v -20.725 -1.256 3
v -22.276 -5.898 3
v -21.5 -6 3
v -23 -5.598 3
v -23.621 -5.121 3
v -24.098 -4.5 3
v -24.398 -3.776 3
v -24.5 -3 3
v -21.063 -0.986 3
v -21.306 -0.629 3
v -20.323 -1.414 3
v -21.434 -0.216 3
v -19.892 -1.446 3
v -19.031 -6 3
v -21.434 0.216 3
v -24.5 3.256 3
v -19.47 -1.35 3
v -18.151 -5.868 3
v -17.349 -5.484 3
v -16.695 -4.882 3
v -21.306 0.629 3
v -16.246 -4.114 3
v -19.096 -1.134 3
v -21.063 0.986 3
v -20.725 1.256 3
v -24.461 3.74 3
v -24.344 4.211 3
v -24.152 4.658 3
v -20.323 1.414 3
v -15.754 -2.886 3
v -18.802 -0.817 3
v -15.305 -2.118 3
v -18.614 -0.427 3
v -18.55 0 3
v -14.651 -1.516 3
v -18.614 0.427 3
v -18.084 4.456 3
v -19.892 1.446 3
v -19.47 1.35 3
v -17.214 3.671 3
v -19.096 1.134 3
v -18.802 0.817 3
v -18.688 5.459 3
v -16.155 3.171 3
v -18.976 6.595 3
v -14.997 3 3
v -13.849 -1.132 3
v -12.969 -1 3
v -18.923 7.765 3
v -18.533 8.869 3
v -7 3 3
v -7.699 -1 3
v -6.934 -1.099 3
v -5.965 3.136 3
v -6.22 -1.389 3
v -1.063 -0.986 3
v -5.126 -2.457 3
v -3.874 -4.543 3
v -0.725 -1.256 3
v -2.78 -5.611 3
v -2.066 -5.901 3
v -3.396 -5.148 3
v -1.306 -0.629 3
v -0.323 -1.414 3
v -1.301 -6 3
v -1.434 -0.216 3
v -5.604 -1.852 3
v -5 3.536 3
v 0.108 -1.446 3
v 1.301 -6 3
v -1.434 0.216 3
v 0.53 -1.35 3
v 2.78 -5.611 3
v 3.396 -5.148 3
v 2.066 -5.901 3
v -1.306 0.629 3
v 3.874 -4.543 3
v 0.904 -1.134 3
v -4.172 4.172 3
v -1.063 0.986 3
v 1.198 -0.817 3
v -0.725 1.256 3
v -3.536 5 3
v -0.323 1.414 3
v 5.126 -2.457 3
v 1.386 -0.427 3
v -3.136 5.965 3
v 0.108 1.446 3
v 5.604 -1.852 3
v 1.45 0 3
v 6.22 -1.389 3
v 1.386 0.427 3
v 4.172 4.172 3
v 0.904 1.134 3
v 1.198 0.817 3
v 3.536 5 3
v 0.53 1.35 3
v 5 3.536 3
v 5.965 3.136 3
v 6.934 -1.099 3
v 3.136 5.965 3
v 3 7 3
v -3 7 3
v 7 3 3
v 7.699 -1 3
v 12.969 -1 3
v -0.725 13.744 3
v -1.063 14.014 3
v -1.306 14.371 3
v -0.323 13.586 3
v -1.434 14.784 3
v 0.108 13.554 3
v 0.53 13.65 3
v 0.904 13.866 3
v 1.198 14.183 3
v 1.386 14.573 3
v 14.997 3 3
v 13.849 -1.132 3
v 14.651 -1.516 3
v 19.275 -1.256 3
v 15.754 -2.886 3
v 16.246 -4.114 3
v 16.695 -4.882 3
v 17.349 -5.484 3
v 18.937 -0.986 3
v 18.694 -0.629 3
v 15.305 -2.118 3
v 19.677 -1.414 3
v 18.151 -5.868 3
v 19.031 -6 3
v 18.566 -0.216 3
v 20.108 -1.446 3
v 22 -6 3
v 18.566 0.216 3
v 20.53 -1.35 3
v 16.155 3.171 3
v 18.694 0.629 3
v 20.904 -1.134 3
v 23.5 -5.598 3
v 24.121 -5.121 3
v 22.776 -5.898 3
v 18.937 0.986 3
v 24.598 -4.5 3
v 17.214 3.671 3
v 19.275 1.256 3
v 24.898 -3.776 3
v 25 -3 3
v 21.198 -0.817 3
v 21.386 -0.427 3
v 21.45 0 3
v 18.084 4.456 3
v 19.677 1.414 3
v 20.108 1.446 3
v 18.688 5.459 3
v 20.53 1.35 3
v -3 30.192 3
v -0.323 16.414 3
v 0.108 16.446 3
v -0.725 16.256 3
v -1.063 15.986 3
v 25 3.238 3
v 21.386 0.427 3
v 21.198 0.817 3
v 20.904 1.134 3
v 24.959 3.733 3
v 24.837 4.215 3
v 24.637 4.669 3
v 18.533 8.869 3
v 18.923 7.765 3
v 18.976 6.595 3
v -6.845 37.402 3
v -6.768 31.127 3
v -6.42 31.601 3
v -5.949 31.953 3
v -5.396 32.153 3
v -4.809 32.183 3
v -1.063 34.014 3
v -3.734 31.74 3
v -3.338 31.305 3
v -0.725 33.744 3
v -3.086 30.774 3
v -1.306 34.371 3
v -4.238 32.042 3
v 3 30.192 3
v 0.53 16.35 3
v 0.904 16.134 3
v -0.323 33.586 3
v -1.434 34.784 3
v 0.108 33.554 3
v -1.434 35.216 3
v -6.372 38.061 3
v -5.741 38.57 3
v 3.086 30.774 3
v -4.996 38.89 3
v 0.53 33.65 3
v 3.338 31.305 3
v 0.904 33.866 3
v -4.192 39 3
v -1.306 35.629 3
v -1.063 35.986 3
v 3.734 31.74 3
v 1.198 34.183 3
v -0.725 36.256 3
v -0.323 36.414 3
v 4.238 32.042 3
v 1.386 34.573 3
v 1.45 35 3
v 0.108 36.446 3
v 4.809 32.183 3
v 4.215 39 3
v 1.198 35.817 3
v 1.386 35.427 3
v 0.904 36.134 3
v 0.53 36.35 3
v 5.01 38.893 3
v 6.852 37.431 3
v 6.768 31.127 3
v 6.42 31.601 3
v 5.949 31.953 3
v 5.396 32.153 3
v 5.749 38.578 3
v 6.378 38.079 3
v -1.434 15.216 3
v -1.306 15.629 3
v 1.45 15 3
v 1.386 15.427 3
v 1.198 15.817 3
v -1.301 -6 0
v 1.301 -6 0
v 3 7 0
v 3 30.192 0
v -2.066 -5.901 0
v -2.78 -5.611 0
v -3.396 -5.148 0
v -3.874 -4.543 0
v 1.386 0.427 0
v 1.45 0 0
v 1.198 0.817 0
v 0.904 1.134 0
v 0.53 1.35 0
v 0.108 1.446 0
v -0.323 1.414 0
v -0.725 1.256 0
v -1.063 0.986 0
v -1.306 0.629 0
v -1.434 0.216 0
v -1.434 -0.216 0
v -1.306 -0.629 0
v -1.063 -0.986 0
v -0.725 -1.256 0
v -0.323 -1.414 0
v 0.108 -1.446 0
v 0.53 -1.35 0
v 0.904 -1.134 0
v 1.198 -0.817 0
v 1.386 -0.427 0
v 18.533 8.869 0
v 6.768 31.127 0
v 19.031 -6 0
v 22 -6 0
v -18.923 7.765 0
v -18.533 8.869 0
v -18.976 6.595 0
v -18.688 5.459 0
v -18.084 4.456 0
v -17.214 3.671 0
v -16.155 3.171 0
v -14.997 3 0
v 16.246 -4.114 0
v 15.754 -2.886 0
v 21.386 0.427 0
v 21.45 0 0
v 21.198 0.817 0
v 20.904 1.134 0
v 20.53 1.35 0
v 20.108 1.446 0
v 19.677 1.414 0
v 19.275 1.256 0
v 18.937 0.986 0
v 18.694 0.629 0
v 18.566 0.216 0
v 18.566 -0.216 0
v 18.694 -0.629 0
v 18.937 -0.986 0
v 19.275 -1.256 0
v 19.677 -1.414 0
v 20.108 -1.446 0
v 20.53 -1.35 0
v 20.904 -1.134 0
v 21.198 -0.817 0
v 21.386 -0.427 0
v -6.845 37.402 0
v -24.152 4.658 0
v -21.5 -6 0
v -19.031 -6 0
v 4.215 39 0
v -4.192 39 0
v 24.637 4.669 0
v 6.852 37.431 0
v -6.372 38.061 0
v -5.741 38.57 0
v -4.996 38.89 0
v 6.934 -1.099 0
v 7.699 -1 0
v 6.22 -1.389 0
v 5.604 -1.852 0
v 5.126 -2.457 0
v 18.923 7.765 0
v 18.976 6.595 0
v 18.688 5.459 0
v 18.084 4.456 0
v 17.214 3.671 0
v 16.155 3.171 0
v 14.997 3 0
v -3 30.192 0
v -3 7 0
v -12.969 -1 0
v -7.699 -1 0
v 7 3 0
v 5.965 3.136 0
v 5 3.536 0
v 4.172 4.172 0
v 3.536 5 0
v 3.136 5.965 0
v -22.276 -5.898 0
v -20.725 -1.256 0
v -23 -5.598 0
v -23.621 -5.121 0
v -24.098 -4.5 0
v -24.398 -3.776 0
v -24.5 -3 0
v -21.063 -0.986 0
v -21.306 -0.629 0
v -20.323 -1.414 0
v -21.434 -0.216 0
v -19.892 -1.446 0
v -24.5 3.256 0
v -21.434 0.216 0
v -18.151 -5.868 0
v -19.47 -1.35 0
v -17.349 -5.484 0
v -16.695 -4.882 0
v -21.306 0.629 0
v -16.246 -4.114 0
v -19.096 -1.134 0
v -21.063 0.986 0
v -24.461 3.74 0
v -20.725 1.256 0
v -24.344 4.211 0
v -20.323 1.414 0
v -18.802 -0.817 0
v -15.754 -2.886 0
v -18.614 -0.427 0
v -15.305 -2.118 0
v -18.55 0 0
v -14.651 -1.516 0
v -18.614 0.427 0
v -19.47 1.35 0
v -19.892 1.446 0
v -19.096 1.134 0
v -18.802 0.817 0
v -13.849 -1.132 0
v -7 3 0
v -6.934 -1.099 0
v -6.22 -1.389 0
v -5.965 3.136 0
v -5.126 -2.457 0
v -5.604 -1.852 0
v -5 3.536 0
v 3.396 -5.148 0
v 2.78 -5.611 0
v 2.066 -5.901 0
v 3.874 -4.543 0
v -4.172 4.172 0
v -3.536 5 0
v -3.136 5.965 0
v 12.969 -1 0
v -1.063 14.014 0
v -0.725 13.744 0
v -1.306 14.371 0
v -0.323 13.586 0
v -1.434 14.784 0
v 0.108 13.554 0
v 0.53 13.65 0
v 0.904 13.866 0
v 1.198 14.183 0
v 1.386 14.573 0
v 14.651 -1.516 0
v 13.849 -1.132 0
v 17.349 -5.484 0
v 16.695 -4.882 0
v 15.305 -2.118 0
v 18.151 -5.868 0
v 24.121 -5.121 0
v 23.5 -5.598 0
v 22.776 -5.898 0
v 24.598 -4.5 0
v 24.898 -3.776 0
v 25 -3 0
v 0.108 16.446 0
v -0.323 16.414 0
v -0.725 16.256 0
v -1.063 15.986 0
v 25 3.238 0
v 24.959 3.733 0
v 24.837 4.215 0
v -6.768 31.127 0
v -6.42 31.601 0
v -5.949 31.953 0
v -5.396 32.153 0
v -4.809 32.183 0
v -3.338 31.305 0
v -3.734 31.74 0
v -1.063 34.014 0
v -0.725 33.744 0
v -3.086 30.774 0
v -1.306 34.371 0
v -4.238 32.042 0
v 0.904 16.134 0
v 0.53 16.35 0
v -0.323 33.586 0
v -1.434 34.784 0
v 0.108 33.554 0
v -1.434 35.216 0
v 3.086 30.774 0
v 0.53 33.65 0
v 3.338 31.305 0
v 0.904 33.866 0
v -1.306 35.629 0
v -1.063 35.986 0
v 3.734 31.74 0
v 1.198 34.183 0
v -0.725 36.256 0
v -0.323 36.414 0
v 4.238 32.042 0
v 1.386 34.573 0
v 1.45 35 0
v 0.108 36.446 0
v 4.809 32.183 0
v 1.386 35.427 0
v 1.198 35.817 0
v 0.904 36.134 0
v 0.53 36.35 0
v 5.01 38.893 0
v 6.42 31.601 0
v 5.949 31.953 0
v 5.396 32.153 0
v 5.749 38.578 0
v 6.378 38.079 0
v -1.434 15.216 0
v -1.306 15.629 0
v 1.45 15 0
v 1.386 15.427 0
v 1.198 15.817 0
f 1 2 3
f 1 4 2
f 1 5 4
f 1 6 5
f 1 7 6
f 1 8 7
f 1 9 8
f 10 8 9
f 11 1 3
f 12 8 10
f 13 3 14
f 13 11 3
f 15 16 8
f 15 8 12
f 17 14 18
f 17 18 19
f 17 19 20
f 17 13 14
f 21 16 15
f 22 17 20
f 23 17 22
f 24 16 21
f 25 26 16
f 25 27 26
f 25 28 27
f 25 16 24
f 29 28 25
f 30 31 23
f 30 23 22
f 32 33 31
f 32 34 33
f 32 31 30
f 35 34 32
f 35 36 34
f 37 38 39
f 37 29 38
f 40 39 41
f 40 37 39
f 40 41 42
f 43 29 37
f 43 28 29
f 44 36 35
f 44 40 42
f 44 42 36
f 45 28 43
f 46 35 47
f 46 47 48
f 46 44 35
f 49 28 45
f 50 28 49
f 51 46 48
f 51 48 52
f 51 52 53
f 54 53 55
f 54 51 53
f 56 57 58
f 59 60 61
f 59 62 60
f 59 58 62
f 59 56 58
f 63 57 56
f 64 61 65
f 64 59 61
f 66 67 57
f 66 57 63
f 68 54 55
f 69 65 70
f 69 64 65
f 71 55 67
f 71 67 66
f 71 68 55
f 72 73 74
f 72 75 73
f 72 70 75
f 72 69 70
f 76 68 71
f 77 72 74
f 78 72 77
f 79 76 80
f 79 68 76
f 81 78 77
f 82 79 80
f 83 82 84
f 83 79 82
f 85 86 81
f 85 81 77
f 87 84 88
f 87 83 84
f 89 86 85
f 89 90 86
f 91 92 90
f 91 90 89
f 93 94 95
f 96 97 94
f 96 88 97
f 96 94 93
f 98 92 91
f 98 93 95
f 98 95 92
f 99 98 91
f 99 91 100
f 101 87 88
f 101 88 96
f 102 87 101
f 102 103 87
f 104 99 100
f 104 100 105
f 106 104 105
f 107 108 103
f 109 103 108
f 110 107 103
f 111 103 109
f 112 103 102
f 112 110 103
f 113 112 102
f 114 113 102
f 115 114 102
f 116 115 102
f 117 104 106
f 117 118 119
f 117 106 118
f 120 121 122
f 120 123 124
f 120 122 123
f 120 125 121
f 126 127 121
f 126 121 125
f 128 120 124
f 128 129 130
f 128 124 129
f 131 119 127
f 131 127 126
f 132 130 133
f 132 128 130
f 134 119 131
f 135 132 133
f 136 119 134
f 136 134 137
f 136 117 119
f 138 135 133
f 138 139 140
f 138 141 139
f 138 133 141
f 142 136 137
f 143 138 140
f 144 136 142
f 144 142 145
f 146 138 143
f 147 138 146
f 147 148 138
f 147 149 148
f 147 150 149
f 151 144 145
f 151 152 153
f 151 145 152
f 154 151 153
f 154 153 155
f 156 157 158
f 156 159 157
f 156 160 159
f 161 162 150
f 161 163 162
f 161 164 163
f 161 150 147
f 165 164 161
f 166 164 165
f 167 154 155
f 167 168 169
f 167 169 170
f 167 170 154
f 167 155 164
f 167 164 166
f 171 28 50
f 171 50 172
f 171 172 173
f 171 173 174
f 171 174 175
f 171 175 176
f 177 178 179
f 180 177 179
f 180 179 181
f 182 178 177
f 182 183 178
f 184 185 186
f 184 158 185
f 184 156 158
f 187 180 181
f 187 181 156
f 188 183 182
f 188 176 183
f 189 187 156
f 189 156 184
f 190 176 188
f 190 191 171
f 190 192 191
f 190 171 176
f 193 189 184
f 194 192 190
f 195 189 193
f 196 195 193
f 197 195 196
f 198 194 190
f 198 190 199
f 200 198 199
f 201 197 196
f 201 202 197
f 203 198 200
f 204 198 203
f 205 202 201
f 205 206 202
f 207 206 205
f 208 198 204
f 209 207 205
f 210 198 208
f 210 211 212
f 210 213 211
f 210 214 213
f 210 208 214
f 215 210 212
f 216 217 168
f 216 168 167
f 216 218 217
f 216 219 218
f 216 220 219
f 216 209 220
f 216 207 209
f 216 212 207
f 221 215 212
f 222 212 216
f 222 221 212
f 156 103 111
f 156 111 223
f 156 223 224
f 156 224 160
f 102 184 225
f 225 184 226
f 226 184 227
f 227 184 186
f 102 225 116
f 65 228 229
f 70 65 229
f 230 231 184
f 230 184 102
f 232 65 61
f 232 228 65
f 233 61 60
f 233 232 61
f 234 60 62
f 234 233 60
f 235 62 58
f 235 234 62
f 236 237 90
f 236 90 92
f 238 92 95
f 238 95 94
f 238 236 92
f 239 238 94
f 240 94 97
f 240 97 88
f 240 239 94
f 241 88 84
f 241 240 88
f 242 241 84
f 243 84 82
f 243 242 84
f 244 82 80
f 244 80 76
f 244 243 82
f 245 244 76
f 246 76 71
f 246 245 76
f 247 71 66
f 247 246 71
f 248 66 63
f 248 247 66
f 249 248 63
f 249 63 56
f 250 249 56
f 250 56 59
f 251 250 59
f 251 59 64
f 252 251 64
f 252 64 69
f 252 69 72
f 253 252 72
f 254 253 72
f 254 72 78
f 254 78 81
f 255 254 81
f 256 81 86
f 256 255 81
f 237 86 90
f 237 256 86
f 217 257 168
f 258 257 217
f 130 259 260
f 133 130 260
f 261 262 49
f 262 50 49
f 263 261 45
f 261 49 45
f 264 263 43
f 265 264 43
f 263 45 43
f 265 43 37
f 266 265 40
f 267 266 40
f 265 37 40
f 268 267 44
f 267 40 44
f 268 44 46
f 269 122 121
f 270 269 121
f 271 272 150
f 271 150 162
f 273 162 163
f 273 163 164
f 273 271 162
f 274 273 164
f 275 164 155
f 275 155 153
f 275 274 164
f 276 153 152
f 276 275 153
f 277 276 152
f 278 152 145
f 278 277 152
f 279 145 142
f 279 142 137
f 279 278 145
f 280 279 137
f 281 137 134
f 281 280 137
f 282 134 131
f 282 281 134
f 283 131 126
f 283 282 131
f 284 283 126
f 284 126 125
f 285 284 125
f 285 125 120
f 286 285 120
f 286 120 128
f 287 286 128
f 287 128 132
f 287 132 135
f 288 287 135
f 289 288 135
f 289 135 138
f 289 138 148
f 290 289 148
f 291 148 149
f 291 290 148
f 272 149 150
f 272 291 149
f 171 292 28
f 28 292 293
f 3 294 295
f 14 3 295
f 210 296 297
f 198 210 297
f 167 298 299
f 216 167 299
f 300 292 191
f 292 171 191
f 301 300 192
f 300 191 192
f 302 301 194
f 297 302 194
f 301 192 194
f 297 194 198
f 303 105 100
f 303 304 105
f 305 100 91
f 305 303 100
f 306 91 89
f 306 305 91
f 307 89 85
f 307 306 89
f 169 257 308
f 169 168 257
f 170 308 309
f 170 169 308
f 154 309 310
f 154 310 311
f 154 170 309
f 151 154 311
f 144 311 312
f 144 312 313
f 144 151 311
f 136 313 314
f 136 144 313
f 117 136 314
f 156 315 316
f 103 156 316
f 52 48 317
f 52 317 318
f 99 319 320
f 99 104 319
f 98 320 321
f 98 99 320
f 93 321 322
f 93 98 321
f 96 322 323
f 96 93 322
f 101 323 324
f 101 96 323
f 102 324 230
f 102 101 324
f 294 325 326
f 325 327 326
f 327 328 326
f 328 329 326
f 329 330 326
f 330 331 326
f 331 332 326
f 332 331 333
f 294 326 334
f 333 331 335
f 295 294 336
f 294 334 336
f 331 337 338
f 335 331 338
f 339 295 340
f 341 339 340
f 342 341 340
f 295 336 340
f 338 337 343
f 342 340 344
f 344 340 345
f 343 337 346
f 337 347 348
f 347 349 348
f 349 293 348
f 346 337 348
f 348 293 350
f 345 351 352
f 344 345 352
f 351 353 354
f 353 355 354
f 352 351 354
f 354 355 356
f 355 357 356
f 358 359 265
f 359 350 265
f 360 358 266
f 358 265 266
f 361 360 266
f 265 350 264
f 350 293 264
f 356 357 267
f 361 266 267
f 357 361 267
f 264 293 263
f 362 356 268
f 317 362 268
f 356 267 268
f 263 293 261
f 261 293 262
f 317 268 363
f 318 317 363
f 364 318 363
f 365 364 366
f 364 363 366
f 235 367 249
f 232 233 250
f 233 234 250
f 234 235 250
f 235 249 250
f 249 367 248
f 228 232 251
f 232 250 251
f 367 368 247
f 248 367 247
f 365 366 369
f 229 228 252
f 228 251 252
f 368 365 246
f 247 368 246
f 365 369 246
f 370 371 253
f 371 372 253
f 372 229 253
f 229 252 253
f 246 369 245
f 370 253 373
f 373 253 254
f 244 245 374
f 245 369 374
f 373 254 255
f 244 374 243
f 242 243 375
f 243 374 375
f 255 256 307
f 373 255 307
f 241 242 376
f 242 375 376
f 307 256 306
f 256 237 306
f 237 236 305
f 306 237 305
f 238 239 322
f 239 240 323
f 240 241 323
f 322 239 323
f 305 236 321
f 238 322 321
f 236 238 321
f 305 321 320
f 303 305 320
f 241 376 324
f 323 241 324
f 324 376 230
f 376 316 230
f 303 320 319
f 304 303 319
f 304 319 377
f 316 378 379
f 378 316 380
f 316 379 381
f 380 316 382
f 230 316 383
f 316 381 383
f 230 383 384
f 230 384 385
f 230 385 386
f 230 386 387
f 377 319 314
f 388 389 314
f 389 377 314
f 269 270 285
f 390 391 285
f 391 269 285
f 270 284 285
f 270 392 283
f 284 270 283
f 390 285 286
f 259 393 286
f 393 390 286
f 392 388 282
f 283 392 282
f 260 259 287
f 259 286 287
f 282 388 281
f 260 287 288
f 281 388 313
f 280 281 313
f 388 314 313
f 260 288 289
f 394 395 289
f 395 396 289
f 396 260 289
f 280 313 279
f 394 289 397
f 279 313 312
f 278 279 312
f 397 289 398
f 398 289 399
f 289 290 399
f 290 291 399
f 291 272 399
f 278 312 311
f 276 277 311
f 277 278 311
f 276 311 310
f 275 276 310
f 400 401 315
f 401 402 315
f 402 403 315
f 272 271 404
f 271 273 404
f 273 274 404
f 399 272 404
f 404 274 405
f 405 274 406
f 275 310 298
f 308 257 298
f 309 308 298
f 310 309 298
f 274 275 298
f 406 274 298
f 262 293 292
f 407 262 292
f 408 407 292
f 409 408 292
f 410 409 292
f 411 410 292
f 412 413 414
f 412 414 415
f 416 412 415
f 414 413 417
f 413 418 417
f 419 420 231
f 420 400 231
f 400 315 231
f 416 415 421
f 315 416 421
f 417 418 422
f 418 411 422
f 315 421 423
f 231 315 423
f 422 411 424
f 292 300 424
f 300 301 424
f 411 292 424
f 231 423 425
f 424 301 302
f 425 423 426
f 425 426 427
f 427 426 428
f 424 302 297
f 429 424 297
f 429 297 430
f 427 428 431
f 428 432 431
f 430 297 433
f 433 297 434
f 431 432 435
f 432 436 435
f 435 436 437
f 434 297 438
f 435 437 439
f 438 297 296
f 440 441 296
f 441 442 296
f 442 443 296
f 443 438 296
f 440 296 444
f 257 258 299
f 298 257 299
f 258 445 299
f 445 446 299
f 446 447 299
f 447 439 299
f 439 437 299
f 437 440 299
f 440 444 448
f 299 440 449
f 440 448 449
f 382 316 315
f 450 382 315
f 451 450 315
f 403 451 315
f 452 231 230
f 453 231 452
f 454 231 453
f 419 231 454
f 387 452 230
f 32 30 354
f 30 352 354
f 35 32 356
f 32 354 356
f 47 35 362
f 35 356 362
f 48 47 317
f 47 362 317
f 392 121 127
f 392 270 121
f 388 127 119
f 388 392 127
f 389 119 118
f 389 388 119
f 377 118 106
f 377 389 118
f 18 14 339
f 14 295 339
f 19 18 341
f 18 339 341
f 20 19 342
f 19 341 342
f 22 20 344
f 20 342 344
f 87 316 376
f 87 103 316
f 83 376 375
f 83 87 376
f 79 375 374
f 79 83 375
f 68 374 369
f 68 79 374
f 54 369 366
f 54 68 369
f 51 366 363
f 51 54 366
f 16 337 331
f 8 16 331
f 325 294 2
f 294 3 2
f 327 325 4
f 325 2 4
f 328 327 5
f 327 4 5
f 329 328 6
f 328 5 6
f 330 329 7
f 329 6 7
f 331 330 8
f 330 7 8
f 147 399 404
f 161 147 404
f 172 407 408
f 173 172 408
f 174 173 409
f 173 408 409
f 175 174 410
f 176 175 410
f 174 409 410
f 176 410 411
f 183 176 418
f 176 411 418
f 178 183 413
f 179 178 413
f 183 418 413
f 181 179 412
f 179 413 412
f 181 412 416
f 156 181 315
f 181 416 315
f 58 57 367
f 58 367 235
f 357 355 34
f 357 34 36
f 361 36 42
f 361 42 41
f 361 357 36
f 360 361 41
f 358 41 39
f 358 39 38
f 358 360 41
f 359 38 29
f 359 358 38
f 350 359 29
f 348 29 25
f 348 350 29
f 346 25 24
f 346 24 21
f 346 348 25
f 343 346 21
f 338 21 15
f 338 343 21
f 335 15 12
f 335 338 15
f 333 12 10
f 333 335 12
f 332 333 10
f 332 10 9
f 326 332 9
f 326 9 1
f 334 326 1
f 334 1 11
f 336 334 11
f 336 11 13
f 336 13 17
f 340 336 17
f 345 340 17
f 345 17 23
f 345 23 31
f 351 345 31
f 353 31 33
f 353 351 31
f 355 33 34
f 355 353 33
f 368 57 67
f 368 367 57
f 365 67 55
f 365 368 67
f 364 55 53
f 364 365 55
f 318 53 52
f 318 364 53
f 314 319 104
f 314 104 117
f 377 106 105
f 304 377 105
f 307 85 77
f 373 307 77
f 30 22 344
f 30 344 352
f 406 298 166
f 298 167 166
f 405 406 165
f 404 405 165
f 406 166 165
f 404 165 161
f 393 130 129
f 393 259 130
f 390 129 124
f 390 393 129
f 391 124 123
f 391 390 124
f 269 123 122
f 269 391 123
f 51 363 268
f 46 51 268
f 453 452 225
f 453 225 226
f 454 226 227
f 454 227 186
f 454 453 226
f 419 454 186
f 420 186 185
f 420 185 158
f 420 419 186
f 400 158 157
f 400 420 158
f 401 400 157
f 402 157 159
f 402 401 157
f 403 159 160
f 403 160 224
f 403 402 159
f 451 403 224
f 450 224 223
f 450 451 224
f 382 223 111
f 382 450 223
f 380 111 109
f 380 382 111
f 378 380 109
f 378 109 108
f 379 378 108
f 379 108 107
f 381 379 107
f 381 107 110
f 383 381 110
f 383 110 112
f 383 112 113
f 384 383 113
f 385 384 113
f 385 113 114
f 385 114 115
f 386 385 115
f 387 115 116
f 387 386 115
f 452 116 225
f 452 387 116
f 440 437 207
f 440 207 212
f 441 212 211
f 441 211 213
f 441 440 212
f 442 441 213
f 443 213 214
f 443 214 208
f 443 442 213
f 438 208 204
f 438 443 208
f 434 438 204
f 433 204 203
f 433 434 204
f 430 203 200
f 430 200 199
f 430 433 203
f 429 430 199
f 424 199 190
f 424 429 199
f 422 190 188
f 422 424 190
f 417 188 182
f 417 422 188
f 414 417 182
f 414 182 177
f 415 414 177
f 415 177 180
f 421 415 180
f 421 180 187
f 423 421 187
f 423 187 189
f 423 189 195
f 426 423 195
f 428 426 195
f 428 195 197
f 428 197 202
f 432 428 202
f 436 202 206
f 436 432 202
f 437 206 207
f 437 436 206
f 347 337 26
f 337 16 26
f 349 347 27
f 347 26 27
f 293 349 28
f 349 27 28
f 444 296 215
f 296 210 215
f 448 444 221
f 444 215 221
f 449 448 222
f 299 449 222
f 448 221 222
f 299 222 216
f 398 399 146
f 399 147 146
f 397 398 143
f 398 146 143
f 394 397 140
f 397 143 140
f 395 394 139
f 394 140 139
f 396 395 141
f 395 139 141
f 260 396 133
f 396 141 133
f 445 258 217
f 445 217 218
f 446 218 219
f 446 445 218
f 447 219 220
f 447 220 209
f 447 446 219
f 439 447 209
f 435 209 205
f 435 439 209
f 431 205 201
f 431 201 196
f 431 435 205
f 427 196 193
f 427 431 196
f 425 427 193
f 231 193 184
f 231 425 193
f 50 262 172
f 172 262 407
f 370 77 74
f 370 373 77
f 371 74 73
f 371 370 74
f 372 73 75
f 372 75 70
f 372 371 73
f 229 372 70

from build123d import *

# Parameters (mm, degrees)
SKETCH_1_R          = 1.45
EXTRUDE_1_DEPTH     = 3
CUT_EXTRUDE_1_DEPTH = 3
FILLET_1_R          = 3
FILLET_2_R          = 4


with BuildPart() as part:
    # 草图1 → 凸台-拉伸1 (new body)
    with BuildSketch(Plane.XY):
        Polygon((-24.5, -6), (25, -6), (25, 4), (6, 39), (-6, 39), (-24.5, 4), align=None)
        with Locations((-20, 0)):
            Circle(SKETCH_1_R, mode=Mode.SUBTRACT)
        with Locations((20, 0)):
            Circle(SKETCH_1_R, mode=Mode.SUBTRACT)
        with Locations((0, 35)):
            Circle(SKETCH_1_R, mode=Mode.SUBTRACT)
        with Locations((0, 15)):
            Circle(SKETCH_1_R, mode=Mode.SUBTRACT)
        Circle(SKETCH_1_R, mode=Mode.SUBTRACT)
        with BuildLine():
            Line((-3, 30.192295018), (-3, 3))
            Line((-3, 3), (-21.635270706, 3))
            Line((-21.635270706, 3), (-6.768189881, 31.126909669))
            ThreePointArc((-6.768189881, 31.126909669), (-4.518533366, 32.133477616), (-3, 30.192295018))
        make_face(mode=Mode.SUBTRACT)
        with BuildLine():
            Line((21.635270706, 3), (6.768189881, 31.126909669))
            ThreePointArc((6.768189881, 31.126909669), (4.518533366, 32.133477616), (3, 30.192295018))
            Line((3, 30.192295018), (3, 3))
            Line((3, 3), (21.635270706, 3))
        make_face(mode=Mode.SUBTRACT)
    extrude(amount=EXTRUDE_1_DEPTH)

    # 草图3 → 切除-拉伸1 (cut)
    with BuildSketch(Plane.XY.offset(3)):
        Polygon((-17, -6), (-15, -1), (-6, -1), (-3, -6), align=None)
        Polygon((3, -6), (17, -6), (15, -1), (6, -1), align=None)
    extrude(amount=-CUT_EXTRUDE_1_DEPTH, mode=Mode.SUBTRACT)

    # 圆角1
    fillet_1_edges = [part.edges().sort_by_distance(p)[0] for p in [
        (-24.5, 4, 1.5),
        (-6, 39, 1.5),
        (6, 39, 1.5),
        (25, 4, 1.5),
        (25, -6, 1.5),
        (-24.5, -6, 1.5),
        (-3, -6, 1.5),
        (-17, -6, 1.5),
        (-15, -1, 1.5),
        (-6, -1, 1.5),
        (3, -6, 1.5),
        (6, -1, 1.5),
        (15, -1, 1.5),
        (17, -6, 1.5),
    ]]
    fillet(fillet_1_edges, radius=FILLET_1_R)

    # 圆角2
    fillet_2_edges = [part.edges().sort_by_distance(p)[0] for p in [
        (-21.635270706, 3, 1.5),
        (-3, 3, 1.5),
        (3, 3, 1.5),
        (21.635270706, 3, 1.5),
    ]]
    fillet(fillet_2_edges, radius=FILLET_2_R)


solid = part.part
